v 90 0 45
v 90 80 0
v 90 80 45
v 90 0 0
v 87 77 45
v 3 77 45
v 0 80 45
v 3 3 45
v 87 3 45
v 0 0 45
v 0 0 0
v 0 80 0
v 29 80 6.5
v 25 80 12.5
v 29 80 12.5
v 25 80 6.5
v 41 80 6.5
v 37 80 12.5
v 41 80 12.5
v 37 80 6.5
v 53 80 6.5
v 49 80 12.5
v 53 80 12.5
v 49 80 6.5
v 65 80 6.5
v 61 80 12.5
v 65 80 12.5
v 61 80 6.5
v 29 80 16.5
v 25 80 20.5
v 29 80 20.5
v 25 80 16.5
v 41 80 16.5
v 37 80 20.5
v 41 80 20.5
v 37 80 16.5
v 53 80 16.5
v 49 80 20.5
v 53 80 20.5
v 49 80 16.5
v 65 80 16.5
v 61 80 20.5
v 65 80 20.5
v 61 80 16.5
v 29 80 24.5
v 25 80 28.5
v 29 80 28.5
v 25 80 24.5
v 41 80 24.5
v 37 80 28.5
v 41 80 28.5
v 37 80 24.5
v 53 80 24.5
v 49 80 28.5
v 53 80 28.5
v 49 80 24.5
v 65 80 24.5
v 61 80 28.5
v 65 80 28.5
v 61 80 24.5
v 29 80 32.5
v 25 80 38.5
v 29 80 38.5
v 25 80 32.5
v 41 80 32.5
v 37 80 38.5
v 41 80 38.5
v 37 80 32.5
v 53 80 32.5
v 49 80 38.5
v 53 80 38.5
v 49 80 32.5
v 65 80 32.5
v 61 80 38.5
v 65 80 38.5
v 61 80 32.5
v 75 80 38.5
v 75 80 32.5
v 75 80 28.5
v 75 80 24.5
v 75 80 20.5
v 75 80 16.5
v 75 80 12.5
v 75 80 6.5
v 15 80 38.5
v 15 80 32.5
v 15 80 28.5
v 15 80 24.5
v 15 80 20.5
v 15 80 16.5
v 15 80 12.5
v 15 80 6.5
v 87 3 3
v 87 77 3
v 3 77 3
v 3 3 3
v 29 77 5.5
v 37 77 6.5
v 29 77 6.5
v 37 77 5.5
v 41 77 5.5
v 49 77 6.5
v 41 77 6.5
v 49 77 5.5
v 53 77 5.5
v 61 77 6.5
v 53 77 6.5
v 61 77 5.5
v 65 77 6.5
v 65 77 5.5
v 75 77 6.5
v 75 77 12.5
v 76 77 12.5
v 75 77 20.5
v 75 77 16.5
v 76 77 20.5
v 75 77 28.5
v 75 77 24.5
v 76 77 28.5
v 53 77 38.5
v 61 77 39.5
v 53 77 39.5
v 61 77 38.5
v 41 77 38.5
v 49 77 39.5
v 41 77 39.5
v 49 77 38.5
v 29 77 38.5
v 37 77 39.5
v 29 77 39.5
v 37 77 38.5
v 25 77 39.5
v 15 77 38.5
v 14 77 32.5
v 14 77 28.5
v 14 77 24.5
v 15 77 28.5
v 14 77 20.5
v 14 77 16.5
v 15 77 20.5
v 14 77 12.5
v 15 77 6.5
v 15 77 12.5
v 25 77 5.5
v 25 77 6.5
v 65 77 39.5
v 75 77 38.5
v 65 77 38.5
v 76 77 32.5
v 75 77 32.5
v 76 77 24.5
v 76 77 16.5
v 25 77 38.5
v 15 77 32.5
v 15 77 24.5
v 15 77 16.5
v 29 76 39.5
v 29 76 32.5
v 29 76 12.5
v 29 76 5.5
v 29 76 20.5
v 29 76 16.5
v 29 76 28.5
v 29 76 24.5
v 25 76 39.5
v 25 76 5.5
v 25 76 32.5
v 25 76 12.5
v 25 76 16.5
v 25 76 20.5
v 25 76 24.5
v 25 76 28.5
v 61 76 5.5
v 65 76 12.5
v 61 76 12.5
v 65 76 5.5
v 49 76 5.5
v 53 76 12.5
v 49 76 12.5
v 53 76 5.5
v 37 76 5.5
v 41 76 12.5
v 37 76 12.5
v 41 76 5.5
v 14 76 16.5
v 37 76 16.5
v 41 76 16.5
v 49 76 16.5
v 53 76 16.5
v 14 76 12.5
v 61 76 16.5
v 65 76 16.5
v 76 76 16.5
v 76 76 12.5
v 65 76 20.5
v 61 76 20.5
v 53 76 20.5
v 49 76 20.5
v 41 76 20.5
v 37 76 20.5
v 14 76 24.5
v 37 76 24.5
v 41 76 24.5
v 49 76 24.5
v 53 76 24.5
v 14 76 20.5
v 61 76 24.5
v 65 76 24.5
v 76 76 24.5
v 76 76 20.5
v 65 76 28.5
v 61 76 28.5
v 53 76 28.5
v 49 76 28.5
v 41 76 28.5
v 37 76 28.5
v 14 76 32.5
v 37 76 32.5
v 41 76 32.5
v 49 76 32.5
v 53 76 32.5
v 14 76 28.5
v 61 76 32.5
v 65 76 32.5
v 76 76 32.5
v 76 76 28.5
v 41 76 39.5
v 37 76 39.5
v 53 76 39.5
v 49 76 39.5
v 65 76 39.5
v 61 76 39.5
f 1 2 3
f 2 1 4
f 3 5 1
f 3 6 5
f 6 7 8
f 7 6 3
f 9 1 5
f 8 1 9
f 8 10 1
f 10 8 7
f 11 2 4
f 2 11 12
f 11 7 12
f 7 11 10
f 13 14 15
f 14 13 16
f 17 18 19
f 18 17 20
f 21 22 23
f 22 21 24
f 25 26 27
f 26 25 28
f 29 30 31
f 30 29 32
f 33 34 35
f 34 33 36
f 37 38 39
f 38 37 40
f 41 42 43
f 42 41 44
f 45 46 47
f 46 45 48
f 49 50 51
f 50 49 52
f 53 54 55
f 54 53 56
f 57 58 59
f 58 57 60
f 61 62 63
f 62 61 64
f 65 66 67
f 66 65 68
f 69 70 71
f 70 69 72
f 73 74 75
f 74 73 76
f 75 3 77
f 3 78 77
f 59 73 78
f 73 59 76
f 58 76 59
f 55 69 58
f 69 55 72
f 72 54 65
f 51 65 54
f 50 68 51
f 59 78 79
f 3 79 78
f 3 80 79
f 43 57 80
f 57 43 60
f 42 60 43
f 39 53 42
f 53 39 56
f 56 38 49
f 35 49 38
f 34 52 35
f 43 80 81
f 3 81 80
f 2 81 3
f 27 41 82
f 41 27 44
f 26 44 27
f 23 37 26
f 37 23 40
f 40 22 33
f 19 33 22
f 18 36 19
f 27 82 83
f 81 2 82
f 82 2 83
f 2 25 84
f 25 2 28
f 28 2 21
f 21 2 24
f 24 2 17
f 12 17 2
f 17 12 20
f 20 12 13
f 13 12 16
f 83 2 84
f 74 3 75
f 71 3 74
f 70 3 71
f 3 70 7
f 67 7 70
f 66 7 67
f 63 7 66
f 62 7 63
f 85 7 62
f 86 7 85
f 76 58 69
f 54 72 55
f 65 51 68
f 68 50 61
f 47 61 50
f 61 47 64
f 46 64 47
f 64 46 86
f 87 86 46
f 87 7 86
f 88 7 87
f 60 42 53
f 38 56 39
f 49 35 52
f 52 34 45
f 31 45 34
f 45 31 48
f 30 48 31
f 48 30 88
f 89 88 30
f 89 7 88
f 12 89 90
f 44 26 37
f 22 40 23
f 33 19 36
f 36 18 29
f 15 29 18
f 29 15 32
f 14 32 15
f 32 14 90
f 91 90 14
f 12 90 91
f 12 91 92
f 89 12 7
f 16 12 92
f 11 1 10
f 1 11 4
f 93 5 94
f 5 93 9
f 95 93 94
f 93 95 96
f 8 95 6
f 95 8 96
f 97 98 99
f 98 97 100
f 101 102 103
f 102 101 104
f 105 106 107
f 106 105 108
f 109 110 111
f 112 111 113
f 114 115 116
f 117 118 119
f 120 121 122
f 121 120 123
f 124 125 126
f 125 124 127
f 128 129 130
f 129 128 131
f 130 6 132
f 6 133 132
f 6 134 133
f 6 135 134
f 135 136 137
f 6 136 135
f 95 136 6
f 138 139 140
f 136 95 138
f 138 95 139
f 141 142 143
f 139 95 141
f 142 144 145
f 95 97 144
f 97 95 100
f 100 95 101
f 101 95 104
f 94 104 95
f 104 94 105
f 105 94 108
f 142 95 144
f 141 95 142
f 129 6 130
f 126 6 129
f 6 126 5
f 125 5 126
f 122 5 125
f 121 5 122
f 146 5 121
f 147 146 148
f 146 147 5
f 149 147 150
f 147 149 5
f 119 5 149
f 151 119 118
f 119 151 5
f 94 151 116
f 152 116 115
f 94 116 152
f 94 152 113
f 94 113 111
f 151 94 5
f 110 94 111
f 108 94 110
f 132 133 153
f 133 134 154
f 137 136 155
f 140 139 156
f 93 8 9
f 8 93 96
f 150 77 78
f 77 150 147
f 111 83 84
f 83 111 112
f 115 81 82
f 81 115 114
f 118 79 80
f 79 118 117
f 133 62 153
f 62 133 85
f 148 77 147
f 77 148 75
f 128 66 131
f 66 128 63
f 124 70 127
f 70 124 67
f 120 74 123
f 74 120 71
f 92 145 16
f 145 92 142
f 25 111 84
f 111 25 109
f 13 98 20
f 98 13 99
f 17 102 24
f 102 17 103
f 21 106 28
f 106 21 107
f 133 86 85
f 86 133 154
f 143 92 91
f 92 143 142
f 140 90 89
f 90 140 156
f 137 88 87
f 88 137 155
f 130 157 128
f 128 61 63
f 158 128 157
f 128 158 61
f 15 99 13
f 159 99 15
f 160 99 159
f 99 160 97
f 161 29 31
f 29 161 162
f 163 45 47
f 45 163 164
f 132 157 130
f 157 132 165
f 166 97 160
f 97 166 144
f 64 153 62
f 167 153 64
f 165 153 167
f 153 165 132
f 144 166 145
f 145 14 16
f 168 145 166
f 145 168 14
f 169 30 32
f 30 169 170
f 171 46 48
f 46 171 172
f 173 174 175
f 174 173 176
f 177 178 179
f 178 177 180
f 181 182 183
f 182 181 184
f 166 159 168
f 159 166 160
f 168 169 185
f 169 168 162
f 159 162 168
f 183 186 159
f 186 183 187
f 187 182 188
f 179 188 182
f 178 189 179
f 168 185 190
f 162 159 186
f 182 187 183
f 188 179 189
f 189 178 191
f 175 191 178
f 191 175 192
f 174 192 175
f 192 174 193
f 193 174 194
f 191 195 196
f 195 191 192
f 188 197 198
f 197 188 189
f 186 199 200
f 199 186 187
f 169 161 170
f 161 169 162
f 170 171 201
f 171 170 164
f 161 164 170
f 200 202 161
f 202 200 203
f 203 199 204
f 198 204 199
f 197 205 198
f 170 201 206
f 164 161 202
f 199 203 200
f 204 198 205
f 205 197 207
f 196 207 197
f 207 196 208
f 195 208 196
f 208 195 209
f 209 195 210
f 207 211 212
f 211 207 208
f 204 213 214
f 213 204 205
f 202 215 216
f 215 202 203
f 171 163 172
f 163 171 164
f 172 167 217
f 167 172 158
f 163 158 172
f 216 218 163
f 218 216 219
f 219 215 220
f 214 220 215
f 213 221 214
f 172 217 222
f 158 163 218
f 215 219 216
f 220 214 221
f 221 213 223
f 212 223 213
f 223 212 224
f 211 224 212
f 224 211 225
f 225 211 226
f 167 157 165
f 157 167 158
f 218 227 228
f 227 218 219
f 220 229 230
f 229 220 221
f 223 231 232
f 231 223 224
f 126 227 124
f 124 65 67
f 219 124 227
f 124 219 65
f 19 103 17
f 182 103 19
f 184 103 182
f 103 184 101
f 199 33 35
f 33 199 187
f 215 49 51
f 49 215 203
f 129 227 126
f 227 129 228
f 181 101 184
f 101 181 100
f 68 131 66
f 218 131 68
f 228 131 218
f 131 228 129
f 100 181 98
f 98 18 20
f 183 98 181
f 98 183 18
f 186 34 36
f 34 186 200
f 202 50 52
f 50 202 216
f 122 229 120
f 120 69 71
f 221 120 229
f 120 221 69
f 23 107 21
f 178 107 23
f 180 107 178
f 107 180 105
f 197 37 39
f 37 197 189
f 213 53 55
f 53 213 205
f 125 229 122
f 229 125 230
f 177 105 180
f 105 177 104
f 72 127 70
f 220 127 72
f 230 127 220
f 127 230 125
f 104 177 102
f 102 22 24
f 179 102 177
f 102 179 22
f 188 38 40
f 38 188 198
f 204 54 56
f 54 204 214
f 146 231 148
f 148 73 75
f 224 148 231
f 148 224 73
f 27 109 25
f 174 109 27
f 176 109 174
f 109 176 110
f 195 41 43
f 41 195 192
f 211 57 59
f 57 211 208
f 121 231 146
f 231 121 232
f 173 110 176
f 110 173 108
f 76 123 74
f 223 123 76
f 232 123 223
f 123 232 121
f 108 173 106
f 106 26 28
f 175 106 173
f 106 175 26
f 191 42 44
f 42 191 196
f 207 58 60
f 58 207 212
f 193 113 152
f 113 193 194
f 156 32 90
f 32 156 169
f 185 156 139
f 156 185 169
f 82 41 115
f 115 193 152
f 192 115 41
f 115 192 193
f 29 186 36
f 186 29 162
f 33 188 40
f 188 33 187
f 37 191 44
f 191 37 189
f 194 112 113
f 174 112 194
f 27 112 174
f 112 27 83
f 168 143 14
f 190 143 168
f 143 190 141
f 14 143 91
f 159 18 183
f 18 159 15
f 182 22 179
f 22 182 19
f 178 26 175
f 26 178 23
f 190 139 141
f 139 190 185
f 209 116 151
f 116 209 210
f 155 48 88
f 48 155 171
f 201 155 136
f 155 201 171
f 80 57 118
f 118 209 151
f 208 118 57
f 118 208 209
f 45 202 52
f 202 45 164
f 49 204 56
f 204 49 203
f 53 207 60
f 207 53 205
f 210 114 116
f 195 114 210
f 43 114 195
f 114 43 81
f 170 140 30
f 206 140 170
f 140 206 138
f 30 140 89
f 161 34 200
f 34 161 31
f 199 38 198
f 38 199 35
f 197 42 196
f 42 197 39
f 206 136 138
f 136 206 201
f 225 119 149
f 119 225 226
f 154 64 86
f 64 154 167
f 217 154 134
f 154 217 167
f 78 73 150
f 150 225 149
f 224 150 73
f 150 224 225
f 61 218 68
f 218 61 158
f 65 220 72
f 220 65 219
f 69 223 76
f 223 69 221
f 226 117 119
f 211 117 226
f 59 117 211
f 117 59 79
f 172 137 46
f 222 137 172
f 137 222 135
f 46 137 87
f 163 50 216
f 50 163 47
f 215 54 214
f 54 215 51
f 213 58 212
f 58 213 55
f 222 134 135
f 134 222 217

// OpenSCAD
$fn = 32;

// ----------------------------------------------------------------------
// Vent box: crossgrid enclosure
// ----------------------------------------------------------------------

// --- parameters (mm) ---
box_l = 90;               // box length, X
box_w = 80;               // box width, Y
box_h = 45;               // box height, Z
wall_t = 3;               // shell wall thickness
win_l = 60;               // vent window width, X
win_h = 32;               // vent window height, Z
bar_w = 4;                // grid bar width
n_v = 4;                  // vertical bar count
n_h = 3;                  // horizontal bar count

win_z0 = (box_h - win_h) / 2;  // window lower edge Z
v_step = win_l / (n_v + 1);  // vertical bar step
h_step = win_h / (n_h + 1);  // horizontal bar step

difference() {
  union() {
    difference() {
      cube([box_l, box_w, box_h]);
  translate([wall_t, wall_t, wall_t])
    cube([box_l - 2 * wall_t, box_w - 2 * wall_t, box_h]);
  translate([(box_l - win_l) / 2, box_w - wall_t - 1, win_z0])
    cube([win_l, wall_t + 2, win_h]);
    }
    for (i = [1 : n_v])
      translate([(box_l - win_l) / 2 + i * v_step - bar_w / 2,
                 box_w - wall_t - 1, win_z0 - 1])
        cube([bar_w, wall_t + 1, win_h + 2]);
    for (i = [1 : n_h])
      translate([(box_l - win_l) / 2 - 1, box_w - wall_t - 1,
                 win_z0 + i * h_step - bar_w / 2])
        cube([win_l + 2, wall_t + 1, bar_w]);
  }
}
